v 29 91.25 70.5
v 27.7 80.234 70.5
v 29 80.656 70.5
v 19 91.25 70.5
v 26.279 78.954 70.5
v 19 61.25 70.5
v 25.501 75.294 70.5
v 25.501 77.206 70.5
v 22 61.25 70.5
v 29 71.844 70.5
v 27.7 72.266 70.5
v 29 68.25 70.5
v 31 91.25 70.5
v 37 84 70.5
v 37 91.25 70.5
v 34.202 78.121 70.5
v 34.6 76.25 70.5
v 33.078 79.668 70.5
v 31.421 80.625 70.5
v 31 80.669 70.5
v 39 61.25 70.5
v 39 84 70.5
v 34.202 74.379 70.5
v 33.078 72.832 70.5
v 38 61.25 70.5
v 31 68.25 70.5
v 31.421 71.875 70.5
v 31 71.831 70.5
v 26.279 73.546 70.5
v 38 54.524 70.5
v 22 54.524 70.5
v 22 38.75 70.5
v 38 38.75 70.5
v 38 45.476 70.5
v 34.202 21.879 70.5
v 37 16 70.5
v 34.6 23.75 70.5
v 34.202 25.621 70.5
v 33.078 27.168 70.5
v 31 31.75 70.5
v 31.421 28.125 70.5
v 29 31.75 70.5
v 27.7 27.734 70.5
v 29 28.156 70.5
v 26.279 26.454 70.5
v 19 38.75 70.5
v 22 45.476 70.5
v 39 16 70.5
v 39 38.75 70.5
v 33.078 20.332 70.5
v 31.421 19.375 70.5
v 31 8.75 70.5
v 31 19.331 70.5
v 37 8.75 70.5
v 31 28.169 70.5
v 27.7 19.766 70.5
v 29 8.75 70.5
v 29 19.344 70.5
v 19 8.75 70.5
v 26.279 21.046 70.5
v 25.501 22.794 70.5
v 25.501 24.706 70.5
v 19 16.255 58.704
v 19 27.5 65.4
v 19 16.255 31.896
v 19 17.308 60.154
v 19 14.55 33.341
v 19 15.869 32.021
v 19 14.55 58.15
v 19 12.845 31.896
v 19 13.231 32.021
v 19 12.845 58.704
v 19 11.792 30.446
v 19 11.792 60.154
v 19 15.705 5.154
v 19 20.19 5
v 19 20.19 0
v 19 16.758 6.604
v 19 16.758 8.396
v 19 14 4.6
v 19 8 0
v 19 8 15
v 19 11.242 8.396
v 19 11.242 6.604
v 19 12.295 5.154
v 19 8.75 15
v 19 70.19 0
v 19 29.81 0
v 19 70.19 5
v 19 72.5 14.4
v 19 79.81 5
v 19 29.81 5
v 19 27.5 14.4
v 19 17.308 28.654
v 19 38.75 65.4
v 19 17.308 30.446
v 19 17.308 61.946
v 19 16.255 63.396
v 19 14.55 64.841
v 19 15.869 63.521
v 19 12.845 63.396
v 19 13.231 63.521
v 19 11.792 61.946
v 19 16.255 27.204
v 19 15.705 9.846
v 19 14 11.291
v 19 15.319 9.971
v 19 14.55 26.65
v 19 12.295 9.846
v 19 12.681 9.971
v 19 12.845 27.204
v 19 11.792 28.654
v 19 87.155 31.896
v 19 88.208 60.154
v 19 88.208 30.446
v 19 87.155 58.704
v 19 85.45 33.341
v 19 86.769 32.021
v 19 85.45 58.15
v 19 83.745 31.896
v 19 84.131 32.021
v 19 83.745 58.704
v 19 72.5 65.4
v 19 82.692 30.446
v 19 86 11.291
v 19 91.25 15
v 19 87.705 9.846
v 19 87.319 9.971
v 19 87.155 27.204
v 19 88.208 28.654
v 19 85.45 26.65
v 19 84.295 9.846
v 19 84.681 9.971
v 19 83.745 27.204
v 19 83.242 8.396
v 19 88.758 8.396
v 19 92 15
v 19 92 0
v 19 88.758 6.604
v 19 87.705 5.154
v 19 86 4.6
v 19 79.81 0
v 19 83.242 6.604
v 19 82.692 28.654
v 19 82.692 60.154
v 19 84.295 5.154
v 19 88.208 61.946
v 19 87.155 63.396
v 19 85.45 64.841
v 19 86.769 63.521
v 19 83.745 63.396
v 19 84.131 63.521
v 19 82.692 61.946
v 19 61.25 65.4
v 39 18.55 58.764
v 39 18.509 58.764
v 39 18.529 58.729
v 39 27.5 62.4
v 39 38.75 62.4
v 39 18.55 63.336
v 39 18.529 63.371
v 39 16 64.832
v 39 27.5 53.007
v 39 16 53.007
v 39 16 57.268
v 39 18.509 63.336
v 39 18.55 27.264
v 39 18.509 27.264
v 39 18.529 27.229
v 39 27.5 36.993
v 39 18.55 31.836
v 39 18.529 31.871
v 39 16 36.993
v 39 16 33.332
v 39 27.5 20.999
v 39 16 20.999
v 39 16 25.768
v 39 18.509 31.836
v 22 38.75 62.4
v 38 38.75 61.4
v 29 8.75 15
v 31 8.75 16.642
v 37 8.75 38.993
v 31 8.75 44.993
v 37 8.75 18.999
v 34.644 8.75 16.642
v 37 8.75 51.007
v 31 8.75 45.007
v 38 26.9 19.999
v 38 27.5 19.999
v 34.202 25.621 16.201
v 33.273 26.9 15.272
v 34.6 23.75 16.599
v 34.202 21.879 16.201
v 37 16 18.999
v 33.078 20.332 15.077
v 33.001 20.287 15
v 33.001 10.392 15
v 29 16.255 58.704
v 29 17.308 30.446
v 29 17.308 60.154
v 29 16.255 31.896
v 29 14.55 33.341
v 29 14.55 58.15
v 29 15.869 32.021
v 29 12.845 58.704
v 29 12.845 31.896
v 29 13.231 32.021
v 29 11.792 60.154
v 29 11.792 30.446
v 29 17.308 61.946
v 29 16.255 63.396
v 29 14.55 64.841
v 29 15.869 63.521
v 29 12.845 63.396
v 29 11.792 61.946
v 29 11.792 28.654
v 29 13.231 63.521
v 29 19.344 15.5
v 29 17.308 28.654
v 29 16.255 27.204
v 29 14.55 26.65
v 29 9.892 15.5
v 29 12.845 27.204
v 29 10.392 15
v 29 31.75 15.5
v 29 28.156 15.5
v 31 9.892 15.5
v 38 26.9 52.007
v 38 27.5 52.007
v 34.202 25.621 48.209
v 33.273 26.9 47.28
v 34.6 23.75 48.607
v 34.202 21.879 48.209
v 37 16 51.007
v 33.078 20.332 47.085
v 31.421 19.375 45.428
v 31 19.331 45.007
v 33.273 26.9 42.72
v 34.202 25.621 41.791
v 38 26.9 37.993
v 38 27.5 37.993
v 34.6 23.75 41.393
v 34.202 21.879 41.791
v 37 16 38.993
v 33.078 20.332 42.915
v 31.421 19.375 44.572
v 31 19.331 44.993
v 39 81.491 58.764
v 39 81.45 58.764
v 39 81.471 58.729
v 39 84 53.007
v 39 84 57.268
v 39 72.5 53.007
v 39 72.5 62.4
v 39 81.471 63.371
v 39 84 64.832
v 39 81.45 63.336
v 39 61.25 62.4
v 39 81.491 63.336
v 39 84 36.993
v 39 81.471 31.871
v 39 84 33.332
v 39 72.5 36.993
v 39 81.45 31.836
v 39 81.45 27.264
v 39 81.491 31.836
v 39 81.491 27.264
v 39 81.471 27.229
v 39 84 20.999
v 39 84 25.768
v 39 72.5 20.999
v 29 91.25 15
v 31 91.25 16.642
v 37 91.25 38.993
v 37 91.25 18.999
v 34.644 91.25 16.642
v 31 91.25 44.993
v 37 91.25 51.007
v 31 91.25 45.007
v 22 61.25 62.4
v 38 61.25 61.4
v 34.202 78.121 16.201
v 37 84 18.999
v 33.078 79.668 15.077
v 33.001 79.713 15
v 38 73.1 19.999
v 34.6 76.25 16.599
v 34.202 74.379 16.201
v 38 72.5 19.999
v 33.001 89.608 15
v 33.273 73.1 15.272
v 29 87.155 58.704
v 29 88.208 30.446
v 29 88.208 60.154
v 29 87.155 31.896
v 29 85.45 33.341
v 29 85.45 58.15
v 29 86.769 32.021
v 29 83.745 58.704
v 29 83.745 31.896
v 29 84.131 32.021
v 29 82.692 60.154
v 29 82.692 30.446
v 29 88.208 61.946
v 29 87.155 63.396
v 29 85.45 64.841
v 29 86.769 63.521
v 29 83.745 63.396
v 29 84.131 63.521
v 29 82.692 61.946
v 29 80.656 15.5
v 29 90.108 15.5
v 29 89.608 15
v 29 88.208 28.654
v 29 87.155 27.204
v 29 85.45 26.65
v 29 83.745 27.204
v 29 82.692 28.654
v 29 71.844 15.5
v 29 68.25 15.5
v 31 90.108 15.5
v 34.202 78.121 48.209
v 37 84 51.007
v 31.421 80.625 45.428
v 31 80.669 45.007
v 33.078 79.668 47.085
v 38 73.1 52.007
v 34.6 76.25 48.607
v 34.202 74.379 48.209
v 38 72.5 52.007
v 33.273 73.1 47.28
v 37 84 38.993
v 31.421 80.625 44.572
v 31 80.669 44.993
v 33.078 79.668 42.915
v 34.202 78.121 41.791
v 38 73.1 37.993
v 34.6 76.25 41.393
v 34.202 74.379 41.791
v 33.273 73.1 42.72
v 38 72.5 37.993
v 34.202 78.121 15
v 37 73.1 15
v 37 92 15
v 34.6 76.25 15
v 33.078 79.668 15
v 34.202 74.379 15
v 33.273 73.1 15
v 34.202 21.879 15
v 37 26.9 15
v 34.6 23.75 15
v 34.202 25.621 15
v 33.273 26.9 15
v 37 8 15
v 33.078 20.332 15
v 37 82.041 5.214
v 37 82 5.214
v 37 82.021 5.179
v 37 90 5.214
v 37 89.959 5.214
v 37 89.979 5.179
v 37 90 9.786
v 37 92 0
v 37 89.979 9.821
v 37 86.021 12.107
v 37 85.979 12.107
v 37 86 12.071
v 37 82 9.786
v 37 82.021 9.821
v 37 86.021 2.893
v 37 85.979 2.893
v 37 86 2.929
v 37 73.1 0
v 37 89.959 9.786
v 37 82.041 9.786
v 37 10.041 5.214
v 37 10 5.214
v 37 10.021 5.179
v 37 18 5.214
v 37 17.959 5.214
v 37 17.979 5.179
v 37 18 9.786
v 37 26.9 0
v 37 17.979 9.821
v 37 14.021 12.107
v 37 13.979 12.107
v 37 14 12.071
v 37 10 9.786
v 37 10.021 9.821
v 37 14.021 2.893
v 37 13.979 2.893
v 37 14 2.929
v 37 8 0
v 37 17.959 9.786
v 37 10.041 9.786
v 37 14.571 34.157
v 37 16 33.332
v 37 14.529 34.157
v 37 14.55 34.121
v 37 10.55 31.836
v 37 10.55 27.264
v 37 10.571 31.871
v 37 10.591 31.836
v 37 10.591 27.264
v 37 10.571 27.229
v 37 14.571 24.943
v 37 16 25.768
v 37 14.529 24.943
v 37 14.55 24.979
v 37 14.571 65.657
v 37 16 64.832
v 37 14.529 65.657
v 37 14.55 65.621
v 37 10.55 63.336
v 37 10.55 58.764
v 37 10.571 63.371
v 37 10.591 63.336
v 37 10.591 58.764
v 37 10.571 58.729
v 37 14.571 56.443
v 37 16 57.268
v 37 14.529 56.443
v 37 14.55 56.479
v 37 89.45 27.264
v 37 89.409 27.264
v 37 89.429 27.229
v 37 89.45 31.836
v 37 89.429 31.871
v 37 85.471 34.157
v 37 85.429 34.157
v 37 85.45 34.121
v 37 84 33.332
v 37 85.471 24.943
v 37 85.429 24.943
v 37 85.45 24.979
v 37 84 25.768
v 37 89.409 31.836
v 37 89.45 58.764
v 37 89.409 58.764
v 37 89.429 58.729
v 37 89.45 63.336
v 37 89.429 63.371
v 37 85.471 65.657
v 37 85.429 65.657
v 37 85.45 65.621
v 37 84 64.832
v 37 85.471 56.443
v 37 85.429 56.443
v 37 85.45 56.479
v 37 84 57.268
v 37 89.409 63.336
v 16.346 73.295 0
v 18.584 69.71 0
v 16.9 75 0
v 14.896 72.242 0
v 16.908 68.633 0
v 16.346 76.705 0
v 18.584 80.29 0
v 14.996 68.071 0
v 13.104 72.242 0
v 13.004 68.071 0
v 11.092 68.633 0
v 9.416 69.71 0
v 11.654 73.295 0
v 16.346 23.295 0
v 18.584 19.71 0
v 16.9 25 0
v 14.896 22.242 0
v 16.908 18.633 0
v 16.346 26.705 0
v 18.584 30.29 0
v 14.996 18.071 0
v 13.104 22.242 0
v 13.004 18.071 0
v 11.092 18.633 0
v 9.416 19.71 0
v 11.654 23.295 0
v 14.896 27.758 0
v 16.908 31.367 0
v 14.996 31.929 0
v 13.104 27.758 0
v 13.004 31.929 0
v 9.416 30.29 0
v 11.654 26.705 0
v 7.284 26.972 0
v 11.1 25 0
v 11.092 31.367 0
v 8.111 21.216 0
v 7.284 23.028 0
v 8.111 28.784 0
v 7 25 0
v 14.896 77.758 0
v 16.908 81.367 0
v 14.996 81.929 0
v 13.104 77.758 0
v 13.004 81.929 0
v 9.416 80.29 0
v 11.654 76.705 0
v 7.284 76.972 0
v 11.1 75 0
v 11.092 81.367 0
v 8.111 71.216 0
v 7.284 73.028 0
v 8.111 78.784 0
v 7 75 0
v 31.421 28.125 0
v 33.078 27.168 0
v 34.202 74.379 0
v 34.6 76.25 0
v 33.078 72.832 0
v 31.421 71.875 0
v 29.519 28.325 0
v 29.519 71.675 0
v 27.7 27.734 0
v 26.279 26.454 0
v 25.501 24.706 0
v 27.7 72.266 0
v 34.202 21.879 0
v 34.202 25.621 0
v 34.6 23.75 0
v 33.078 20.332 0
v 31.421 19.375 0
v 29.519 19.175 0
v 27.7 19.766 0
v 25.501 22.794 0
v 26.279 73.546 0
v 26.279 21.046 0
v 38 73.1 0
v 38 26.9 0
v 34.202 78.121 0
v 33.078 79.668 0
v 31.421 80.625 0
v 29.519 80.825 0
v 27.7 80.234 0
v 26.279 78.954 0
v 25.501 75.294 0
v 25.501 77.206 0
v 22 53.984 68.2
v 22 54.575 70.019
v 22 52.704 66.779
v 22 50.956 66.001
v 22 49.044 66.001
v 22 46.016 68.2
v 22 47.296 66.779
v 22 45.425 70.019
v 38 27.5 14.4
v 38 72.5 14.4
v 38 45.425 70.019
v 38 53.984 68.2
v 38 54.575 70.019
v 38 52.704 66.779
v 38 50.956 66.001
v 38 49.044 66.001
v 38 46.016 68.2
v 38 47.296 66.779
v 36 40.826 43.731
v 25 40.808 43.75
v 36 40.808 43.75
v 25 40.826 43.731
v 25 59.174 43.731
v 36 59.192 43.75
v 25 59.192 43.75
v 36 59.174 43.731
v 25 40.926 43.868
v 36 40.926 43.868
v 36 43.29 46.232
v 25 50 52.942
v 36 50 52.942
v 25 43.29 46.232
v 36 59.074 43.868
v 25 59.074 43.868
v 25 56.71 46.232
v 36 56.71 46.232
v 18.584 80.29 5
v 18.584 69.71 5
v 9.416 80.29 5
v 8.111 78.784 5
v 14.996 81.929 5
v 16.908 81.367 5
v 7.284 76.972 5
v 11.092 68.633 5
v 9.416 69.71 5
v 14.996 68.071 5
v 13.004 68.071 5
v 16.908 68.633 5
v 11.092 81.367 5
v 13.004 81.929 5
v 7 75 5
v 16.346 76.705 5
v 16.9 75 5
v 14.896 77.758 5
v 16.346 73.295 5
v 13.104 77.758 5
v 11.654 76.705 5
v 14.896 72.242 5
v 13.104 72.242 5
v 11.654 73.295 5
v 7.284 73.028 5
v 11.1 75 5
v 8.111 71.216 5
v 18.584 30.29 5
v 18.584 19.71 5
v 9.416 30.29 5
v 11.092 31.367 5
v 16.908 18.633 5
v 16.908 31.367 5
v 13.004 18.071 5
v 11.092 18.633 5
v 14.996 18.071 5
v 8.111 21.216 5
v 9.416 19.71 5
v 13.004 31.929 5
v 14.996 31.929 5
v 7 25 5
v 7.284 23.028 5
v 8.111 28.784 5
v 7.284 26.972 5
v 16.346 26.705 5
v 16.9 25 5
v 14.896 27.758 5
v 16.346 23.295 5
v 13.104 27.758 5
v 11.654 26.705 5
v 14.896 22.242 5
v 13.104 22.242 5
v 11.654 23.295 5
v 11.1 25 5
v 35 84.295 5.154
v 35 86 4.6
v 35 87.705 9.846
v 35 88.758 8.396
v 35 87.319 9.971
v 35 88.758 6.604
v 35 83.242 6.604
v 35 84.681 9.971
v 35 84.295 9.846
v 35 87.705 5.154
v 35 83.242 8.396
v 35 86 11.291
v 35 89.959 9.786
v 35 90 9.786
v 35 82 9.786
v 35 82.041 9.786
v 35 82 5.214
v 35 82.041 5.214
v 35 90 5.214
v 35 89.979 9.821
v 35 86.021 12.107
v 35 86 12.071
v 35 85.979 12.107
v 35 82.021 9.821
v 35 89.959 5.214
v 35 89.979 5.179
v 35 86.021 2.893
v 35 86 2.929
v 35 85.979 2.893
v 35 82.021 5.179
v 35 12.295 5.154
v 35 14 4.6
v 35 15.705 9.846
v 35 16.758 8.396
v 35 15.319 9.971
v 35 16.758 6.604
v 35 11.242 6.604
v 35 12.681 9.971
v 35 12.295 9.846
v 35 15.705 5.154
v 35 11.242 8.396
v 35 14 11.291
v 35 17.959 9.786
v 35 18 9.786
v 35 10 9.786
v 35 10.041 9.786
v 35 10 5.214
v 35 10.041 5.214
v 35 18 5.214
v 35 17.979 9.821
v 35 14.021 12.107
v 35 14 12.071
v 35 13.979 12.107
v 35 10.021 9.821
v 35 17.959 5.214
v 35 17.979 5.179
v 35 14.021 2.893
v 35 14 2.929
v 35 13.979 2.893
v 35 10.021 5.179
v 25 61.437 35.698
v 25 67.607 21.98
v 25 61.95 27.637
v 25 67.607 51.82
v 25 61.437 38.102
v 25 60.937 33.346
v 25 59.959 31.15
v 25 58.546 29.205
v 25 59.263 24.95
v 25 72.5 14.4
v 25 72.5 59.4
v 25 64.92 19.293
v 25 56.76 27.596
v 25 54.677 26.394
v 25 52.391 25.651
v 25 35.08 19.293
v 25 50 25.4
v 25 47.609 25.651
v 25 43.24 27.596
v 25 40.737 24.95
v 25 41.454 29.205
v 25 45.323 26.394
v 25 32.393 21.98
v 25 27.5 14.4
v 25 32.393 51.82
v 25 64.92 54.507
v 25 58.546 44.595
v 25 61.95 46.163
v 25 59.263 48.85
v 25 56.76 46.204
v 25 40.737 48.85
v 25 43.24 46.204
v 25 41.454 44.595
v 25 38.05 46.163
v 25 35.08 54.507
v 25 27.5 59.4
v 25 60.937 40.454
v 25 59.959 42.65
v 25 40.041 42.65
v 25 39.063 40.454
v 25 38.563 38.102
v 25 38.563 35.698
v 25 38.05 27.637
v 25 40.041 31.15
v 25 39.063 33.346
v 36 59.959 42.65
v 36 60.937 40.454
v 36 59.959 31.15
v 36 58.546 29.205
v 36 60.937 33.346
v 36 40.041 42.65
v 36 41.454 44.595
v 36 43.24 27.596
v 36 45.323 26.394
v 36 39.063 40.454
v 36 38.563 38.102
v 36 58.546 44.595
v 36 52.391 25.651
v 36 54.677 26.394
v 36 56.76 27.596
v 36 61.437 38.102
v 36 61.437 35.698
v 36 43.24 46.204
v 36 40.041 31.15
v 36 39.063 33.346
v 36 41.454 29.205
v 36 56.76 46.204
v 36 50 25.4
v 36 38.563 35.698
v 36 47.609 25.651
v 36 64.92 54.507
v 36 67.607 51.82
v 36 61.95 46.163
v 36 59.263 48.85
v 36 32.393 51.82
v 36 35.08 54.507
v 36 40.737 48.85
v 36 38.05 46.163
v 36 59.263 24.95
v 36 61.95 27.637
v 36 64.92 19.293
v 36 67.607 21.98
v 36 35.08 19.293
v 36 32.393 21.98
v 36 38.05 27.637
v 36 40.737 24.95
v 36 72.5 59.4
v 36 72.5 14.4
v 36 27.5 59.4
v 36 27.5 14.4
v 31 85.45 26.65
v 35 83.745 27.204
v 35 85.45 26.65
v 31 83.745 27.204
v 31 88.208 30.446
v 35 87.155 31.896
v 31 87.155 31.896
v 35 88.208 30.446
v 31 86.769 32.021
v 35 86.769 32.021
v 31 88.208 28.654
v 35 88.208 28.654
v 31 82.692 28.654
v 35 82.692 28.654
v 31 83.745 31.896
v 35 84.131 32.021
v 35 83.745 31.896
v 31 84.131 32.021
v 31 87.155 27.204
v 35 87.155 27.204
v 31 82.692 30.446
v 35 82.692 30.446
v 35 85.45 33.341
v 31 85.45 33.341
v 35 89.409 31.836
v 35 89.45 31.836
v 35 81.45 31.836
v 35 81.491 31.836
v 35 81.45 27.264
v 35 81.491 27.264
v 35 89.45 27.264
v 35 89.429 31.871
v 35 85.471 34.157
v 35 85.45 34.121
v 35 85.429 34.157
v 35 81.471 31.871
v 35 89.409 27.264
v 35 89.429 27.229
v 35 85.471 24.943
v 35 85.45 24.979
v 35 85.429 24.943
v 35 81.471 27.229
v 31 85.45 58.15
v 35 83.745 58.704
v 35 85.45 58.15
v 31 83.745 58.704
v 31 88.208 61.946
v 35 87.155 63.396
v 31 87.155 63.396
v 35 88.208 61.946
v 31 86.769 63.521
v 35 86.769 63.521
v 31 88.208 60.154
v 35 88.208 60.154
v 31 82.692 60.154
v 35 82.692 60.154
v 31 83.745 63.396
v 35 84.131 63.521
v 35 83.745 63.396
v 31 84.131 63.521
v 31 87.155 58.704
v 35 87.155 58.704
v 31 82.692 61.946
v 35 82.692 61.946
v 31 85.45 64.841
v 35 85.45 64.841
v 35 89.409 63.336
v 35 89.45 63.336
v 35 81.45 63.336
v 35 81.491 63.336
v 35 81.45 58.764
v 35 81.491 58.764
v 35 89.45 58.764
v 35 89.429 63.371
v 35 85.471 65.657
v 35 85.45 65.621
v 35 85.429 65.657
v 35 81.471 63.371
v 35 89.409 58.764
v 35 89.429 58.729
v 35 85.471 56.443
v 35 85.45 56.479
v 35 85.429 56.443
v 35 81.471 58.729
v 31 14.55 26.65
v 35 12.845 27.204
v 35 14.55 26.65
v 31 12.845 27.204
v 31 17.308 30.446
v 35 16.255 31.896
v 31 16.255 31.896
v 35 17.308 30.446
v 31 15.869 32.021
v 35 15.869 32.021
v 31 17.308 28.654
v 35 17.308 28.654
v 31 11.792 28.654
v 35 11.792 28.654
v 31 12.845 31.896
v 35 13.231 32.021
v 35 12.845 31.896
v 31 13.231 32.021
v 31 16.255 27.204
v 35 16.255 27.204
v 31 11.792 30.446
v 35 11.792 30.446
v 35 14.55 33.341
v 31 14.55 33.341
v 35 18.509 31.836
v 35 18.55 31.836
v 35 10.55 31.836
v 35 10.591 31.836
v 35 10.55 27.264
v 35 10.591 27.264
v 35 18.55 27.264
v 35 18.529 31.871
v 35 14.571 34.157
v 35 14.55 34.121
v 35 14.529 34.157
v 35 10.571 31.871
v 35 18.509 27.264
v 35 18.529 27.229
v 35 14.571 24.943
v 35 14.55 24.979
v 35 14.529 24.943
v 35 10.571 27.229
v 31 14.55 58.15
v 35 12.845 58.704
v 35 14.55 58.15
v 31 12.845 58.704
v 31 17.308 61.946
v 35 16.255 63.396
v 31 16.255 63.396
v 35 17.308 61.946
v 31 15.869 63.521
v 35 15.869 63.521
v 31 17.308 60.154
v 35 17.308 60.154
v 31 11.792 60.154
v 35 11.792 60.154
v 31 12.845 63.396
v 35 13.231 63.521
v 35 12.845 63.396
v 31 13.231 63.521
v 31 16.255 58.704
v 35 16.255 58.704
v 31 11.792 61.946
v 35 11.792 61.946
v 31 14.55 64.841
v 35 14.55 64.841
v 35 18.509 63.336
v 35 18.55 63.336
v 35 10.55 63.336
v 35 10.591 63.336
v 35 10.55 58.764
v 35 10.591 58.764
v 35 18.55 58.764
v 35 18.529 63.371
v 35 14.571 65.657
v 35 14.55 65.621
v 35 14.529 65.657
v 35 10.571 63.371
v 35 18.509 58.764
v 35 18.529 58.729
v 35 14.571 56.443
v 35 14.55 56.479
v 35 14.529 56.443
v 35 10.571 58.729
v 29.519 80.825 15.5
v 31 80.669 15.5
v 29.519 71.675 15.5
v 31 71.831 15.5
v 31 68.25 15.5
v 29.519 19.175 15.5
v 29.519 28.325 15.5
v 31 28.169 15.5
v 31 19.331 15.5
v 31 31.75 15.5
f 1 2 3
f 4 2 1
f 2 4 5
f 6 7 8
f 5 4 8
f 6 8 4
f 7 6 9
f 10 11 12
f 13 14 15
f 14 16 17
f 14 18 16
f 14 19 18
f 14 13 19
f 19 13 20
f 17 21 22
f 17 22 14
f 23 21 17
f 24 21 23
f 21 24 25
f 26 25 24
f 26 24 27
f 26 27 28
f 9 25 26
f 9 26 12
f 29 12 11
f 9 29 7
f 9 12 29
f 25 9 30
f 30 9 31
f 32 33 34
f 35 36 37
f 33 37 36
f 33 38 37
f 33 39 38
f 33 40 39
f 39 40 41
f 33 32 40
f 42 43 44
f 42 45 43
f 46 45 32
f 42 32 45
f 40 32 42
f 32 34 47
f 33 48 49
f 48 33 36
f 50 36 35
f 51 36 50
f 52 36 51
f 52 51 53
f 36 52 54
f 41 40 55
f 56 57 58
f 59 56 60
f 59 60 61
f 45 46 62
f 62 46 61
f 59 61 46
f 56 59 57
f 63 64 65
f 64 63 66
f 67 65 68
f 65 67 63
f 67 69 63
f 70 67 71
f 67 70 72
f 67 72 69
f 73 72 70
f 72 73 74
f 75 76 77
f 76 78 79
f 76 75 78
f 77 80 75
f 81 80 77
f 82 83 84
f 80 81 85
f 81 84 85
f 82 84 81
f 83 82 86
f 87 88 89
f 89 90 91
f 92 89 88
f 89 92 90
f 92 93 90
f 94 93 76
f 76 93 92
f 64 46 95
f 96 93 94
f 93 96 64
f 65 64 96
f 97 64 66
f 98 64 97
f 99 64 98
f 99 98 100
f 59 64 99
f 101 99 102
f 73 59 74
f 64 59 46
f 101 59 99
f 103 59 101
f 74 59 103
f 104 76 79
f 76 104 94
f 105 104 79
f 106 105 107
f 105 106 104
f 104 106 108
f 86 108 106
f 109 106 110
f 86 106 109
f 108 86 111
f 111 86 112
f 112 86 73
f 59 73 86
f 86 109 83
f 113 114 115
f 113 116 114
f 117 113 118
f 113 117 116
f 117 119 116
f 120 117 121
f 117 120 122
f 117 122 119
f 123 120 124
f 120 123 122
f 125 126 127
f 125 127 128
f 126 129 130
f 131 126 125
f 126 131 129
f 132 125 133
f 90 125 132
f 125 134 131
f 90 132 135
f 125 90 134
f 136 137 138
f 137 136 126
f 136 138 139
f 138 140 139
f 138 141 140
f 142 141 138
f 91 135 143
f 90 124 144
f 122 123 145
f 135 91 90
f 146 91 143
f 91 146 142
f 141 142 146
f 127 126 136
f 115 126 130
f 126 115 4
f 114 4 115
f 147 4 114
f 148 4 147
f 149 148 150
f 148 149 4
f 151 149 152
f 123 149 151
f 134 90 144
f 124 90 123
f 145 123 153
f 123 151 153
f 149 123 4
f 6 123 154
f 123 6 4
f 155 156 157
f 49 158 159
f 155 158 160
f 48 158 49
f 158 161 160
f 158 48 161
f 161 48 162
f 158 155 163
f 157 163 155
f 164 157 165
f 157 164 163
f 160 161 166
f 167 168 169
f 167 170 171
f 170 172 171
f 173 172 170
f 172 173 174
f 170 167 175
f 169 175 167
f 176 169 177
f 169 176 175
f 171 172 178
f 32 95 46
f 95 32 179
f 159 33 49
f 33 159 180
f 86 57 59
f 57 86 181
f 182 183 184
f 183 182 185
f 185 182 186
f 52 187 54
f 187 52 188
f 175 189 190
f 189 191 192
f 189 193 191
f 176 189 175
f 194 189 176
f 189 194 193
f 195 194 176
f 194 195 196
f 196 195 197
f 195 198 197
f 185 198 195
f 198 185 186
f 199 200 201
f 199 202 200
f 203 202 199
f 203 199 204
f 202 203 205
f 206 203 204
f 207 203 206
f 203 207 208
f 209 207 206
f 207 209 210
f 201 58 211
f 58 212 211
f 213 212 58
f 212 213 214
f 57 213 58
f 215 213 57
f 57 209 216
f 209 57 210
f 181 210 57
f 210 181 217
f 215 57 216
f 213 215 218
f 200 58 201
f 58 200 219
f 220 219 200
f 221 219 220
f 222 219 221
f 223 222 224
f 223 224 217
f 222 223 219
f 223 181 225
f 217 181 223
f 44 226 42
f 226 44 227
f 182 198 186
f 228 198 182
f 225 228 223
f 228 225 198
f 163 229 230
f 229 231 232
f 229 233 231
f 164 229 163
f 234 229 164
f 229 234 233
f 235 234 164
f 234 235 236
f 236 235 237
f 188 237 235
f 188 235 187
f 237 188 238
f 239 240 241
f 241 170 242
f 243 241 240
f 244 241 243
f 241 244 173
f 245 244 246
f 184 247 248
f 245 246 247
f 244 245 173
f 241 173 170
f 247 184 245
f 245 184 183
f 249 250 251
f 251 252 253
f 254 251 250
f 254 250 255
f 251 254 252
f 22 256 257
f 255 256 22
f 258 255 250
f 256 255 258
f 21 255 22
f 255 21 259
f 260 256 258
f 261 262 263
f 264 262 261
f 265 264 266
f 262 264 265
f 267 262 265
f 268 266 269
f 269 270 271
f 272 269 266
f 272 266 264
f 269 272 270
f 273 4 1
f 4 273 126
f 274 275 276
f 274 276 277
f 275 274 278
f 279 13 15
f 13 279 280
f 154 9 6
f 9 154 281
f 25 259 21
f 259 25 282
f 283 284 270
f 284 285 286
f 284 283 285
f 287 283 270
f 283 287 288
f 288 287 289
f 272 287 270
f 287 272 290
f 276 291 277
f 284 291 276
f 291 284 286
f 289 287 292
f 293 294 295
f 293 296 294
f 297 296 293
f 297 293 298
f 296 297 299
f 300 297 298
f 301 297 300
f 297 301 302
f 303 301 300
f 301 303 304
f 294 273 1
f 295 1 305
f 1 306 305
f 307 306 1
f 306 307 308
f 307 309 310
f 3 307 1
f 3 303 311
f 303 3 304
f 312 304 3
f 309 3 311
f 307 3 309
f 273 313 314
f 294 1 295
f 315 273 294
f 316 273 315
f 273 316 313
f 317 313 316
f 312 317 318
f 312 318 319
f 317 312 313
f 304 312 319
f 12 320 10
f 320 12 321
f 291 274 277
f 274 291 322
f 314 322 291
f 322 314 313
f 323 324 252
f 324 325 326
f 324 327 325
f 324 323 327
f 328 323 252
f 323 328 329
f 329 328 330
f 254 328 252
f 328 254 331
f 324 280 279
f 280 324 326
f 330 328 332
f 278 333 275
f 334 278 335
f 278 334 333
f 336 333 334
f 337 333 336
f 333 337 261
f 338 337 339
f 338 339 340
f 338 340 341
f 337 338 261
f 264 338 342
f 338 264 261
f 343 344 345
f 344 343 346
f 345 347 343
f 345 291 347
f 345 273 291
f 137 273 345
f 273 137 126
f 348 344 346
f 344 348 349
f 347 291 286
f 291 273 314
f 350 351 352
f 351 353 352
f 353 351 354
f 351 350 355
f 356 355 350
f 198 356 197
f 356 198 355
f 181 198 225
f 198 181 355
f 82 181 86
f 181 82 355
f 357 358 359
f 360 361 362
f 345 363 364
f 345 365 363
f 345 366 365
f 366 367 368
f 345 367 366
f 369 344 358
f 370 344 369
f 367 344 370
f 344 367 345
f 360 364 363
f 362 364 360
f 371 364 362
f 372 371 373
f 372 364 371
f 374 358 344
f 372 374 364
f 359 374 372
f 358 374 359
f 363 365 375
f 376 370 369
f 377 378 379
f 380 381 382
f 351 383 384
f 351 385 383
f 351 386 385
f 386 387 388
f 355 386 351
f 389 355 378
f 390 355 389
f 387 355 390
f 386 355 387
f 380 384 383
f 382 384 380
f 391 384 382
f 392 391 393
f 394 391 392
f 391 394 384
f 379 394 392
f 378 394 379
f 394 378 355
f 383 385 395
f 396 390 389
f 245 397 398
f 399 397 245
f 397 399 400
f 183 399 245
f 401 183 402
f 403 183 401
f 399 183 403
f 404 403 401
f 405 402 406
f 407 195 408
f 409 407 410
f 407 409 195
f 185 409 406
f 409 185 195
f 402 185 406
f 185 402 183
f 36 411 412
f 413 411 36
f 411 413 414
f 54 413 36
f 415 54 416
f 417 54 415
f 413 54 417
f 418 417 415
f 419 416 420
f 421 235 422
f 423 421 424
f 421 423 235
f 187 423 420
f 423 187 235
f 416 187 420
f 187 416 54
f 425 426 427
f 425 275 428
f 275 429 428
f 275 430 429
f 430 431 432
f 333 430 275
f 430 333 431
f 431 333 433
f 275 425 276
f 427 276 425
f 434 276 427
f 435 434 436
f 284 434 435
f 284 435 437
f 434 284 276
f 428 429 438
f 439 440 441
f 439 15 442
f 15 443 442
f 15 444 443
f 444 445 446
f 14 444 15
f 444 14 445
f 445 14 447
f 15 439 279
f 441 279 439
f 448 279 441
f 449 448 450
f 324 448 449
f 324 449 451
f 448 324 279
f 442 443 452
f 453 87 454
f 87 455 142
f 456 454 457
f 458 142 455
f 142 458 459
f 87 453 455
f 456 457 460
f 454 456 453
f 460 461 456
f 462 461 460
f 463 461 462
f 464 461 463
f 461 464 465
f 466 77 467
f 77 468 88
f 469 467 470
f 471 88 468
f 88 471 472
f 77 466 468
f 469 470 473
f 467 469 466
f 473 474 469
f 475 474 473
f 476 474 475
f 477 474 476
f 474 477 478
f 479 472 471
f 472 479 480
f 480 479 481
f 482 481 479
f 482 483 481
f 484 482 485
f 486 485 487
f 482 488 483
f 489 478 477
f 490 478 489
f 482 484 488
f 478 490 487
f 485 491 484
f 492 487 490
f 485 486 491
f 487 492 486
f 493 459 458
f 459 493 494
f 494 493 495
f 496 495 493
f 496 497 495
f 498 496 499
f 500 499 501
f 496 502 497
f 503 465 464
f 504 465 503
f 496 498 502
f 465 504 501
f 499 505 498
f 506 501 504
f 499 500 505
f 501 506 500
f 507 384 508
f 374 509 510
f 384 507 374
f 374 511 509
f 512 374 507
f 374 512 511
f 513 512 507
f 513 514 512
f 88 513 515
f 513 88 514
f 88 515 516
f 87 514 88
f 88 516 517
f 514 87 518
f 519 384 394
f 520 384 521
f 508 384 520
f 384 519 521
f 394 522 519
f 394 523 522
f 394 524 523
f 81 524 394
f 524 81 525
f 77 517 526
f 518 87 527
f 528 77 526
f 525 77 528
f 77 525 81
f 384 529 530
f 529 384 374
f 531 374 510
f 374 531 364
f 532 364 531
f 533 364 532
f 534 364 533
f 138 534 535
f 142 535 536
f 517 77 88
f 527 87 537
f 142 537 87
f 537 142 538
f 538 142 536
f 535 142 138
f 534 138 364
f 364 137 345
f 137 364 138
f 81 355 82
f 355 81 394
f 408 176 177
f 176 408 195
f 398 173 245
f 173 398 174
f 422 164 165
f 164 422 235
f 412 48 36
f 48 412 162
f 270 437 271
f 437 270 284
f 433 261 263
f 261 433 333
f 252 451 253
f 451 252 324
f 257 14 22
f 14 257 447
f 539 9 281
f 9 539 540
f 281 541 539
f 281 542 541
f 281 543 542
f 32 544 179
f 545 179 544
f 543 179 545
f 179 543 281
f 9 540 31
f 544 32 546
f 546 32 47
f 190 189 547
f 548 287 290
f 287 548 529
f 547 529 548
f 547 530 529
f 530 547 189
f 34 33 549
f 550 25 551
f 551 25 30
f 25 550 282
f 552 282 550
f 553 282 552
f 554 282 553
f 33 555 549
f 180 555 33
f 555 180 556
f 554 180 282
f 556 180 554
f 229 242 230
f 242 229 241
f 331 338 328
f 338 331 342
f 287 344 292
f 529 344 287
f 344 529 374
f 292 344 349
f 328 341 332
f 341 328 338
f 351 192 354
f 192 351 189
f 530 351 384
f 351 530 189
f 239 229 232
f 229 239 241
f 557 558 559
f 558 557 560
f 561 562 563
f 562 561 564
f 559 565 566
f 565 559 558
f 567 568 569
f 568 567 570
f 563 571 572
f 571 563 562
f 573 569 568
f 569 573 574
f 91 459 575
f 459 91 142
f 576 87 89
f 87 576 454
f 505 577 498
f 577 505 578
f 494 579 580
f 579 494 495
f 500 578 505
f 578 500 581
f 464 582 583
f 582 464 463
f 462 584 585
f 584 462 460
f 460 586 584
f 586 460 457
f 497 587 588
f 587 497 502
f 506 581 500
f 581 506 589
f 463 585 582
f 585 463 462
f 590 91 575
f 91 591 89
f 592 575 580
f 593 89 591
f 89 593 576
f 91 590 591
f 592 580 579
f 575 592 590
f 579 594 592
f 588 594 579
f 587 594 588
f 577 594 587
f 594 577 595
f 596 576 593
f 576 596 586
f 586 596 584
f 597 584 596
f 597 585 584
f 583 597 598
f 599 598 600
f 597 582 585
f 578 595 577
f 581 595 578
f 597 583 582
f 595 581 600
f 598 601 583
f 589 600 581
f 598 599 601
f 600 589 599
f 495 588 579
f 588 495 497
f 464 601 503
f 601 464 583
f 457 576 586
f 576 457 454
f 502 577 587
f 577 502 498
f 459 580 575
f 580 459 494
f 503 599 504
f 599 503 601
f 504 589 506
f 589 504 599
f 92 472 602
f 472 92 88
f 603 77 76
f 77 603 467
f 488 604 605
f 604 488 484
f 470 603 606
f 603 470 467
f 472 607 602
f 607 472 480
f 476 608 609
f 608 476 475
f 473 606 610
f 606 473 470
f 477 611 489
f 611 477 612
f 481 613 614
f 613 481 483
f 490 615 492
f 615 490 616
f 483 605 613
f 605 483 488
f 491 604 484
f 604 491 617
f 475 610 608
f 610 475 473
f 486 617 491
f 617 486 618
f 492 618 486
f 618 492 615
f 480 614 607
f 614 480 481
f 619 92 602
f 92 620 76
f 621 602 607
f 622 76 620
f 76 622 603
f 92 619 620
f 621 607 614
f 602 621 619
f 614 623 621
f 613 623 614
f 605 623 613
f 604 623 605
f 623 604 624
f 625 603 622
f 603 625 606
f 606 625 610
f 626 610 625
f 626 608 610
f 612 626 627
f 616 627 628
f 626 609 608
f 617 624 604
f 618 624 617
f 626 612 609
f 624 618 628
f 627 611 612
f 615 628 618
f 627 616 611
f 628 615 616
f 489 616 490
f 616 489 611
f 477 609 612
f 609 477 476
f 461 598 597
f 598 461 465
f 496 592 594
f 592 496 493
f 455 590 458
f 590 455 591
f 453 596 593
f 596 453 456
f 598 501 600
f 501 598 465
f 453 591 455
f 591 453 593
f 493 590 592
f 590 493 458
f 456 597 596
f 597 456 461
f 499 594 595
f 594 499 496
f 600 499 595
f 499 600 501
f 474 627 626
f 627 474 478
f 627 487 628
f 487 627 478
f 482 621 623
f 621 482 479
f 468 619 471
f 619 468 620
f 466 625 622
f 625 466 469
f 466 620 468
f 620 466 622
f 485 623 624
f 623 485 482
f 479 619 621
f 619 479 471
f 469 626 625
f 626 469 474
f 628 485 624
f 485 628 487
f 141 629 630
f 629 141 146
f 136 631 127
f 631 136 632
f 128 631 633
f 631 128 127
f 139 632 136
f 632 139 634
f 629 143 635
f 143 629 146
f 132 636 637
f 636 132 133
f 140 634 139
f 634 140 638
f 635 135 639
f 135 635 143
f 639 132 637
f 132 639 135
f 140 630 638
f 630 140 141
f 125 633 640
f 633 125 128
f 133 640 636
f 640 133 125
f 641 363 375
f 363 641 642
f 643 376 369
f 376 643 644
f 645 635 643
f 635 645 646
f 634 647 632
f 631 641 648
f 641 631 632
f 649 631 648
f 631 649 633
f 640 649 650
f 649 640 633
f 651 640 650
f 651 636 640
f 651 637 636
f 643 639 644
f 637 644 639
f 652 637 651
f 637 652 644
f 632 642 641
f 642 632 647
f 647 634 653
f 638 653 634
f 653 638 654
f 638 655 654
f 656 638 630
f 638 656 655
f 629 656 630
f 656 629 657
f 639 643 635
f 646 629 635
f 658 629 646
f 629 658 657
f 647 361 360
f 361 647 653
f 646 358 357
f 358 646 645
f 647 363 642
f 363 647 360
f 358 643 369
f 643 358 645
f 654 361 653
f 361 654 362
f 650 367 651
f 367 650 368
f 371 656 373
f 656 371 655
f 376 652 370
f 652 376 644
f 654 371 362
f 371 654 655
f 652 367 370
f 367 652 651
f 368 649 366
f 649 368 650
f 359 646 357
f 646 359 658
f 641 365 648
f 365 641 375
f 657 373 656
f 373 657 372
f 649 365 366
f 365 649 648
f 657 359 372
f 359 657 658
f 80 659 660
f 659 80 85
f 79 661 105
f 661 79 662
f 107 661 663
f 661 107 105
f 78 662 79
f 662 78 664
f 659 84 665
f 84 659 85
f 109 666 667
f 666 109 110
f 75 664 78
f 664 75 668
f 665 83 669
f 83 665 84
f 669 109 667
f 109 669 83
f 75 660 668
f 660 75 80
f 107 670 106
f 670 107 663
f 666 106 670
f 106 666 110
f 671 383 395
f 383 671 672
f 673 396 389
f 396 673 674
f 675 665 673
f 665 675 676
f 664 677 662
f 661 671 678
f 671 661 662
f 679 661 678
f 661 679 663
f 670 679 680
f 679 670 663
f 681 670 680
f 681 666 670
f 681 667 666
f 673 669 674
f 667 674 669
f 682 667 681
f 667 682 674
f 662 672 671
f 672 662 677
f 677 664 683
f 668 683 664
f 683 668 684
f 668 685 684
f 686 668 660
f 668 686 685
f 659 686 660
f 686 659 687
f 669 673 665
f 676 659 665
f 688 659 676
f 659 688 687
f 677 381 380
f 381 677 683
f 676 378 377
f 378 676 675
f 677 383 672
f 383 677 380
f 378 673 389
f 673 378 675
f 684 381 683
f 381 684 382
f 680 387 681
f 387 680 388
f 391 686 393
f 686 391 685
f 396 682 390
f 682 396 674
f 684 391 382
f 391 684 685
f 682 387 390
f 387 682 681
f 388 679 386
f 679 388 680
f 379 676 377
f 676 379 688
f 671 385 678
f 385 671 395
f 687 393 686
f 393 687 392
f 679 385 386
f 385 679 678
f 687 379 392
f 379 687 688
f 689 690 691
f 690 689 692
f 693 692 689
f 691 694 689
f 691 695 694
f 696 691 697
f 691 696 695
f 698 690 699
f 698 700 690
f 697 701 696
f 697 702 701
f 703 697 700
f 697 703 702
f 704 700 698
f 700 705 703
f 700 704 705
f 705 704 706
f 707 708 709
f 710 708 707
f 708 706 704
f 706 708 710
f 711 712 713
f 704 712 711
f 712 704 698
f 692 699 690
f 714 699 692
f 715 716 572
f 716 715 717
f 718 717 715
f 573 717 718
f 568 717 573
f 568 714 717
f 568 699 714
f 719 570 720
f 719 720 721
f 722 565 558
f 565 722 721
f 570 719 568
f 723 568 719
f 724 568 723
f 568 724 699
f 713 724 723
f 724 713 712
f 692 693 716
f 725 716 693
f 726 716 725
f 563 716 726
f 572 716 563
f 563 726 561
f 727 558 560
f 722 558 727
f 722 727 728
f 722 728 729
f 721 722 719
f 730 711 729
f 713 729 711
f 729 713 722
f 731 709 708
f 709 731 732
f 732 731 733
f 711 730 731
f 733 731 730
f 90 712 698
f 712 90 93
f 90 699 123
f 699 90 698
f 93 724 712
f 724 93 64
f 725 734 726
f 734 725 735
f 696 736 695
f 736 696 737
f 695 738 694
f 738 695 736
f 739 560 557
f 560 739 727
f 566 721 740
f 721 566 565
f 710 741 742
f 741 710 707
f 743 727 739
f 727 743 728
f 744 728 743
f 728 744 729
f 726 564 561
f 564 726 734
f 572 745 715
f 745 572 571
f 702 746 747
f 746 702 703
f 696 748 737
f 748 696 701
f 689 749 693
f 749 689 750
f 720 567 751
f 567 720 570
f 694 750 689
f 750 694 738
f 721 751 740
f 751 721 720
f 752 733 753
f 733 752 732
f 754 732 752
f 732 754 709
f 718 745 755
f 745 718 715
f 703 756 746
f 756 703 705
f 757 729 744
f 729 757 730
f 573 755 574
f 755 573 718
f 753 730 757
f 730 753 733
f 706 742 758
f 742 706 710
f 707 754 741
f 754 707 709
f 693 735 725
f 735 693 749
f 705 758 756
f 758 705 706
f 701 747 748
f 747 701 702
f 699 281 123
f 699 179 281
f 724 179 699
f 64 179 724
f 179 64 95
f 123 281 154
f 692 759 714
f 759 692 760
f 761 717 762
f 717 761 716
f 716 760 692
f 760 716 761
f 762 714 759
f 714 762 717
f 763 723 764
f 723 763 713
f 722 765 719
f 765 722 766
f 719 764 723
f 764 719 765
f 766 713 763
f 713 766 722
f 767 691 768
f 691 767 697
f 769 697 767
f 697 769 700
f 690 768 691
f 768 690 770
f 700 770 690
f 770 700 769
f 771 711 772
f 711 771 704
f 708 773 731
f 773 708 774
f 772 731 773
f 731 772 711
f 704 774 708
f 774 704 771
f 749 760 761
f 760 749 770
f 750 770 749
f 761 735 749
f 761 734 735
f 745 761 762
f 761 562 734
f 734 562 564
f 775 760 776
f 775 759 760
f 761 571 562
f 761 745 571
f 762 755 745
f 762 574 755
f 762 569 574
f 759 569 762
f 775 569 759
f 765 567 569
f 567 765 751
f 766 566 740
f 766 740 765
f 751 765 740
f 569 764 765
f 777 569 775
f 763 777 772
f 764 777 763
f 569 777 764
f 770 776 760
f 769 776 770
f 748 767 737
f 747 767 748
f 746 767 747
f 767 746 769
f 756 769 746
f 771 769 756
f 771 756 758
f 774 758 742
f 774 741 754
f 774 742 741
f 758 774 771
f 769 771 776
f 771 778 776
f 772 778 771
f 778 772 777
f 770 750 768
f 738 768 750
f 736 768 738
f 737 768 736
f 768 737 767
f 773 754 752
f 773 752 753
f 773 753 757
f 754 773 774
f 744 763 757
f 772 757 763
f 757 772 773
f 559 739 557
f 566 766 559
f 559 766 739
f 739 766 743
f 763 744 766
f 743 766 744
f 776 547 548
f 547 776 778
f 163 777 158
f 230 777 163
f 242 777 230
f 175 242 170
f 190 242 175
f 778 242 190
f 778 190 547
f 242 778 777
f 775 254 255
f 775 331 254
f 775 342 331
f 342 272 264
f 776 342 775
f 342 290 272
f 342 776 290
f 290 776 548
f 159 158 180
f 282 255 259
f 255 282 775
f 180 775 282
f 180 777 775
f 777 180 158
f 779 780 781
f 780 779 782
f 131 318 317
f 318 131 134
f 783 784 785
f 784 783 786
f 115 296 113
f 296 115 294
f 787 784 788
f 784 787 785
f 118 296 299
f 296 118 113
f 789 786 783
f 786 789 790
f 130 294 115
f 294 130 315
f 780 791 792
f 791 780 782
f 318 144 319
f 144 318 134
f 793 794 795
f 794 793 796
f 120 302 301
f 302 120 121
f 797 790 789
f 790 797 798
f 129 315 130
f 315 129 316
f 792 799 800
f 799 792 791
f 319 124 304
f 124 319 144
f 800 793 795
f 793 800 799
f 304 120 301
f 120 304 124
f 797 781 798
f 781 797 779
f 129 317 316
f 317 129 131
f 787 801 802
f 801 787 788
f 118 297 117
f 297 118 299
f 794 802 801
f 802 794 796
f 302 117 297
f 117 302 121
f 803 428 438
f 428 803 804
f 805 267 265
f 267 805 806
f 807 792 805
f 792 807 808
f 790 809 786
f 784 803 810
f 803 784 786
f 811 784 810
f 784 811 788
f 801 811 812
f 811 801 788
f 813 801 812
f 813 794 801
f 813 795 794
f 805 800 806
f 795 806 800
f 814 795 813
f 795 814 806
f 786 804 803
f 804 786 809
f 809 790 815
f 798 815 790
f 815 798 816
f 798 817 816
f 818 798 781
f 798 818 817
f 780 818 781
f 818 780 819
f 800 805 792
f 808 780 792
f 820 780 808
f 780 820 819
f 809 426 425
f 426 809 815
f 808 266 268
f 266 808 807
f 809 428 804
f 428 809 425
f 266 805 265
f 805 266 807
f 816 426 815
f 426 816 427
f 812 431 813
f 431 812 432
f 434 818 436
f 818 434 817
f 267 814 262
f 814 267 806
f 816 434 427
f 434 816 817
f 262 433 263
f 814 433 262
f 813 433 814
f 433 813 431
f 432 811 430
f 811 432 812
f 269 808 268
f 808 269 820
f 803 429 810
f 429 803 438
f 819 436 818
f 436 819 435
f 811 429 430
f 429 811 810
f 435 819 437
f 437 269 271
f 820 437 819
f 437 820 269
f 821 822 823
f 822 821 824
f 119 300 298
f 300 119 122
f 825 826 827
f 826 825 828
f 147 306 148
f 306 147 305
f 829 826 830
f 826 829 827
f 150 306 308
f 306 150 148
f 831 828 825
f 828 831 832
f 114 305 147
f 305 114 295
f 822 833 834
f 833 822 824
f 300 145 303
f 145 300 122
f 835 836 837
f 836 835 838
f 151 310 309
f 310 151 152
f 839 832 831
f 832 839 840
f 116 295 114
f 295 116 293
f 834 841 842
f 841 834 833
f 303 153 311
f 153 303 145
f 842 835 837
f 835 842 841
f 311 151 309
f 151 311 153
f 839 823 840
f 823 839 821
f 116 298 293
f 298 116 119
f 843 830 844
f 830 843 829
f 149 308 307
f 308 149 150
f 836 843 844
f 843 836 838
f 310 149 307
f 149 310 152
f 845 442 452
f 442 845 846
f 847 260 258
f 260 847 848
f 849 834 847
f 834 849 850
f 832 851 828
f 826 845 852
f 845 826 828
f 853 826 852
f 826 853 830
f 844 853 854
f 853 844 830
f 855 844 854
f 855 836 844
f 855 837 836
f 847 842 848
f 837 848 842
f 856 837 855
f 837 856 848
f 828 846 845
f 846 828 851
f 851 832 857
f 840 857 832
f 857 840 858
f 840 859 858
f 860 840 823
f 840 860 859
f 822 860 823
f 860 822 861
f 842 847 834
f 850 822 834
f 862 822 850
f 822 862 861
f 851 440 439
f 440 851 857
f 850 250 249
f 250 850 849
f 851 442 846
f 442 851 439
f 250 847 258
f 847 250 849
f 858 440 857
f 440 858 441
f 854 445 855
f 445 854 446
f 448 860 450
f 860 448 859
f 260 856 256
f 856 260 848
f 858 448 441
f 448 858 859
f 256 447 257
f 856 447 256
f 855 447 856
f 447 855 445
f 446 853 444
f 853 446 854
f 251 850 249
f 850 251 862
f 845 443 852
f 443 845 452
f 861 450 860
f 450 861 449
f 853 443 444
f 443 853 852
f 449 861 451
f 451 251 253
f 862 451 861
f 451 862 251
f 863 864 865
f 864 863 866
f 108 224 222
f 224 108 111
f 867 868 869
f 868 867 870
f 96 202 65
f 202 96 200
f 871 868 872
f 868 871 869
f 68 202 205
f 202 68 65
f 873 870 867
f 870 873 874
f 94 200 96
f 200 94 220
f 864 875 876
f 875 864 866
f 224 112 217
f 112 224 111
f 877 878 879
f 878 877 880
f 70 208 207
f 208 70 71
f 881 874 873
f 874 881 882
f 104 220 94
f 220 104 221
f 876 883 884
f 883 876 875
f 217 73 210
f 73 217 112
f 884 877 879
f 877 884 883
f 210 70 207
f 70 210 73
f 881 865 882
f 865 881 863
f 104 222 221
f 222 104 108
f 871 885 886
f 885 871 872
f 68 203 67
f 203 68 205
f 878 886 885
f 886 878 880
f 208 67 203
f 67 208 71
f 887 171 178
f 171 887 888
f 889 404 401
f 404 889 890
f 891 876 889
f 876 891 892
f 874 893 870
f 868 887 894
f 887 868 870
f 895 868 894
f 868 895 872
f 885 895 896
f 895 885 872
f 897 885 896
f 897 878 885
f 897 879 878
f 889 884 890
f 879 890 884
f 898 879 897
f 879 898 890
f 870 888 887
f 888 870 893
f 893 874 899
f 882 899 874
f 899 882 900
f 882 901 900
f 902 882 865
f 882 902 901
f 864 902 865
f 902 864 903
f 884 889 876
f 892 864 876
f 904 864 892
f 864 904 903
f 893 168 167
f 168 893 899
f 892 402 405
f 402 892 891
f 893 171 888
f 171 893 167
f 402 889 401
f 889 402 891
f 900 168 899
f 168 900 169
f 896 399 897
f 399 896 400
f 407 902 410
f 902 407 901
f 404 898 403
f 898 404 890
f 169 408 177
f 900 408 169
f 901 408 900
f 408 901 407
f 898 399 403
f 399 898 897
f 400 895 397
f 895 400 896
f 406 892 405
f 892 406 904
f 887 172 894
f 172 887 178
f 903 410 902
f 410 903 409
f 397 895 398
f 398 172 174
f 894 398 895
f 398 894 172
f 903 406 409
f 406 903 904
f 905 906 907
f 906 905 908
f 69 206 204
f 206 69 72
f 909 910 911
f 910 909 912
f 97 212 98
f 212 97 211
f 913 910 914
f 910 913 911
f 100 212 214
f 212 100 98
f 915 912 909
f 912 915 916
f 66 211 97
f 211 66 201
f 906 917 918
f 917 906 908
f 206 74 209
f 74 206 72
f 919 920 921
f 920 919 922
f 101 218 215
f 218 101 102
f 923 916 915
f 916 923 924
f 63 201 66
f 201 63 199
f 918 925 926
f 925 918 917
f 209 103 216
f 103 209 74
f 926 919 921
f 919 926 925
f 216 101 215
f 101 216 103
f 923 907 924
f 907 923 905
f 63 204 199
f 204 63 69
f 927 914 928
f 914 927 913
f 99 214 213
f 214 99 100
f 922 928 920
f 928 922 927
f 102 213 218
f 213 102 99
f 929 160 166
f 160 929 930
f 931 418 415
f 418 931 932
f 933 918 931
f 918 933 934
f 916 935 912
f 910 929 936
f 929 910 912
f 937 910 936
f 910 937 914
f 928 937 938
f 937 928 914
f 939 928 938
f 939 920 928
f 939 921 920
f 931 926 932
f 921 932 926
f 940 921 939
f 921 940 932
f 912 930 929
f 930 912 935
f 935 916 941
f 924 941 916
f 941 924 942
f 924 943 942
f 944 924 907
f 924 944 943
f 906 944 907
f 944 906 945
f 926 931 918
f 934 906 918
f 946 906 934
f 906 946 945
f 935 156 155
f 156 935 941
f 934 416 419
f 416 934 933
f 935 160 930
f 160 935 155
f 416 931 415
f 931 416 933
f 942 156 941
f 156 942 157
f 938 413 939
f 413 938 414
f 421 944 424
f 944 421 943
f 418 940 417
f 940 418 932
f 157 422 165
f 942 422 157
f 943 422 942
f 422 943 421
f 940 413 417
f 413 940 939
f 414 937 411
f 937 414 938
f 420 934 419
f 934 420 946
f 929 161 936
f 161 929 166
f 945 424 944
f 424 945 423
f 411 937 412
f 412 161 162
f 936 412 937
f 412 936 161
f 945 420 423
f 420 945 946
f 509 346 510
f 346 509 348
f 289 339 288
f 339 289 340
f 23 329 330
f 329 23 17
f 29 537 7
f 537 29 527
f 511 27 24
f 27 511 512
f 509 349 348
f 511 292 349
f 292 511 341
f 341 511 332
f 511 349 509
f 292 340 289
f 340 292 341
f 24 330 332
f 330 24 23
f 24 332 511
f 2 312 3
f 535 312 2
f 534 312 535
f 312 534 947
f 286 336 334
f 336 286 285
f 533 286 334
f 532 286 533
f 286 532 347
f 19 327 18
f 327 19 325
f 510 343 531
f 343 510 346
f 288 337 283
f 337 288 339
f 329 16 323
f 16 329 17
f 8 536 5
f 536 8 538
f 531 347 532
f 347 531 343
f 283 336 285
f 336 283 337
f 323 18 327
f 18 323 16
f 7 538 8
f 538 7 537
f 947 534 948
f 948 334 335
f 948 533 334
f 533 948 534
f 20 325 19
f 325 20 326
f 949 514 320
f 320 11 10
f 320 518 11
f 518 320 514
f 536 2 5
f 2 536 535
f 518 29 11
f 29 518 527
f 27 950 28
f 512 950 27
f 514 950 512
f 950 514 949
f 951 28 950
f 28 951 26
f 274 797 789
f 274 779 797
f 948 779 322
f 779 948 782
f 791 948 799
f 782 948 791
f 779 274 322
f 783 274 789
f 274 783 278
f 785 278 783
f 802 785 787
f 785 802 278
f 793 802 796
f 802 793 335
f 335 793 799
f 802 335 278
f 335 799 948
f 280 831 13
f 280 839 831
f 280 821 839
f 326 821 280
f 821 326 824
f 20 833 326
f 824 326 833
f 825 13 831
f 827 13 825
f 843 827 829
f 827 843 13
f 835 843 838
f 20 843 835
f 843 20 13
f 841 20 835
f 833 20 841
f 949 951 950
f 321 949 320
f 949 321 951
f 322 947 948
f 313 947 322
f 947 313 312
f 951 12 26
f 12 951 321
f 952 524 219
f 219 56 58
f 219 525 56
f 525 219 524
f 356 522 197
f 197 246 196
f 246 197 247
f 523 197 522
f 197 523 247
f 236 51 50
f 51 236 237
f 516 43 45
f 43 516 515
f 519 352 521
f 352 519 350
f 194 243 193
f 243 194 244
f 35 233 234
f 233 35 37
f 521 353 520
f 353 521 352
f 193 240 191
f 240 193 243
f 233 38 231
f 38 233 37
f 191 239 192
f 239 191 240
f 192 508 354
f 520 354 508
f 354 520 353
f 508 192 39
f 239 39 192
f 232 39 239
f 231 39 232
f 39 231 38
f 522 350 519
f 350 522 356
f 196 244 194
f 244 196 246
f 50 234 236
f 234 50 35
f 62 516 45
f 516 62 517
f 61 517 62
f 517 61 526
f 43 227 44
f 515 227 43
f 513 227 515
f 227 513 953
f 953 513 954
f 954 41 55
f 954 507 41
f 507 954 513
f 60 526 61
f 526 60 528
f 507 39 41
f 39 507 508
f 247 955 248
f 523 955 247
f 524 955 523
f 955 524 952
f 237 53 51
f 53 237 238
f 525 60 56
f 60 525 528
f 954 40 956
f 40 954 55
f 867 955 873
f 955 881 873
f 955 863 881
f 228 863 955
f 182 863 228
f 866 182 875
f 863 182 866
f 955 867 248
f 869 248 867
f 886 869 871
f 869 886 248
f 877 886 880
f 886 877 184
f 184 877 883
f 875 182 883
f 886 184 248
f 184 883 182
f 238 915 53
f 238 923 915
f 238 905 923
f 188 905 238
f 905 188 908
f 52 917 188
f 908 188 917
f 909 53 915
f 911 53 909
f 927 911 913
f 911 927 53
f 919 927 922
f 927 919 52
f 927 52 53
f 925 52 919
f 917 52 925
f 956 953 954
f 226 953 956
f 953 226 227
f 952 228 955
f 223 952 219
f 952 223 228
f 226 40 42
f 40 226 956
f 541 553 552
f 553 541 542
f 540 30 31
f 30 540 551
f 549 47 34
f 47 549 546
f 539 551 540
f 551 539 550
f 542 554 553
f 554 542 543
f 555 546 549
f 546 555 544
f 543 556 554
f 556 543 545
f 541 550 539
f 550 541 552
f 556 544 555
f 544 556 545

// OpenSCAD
// 
/*
 *  OpenSCAD Shapes Library (www.openscad.at)
 *  One-piece X Motor bracket for Mendel
 *  by Vik Olliver. Based on examples which are:
 *  Copyright (C) 2009  Catarina Mota <clifford@clifford.at>
 *
 *  This program is free software; you can redistribute it and/or modify
 *  it under the terms of the GNU General Public License as published by
 *  the Free Software Foundation; either version 2 of the License, or
 *  (at your option) any later version.
 *
 *  This program is distributed in the hope that it will be useful,
 *  but WITHOUT ANY WARRANTY; without even the implied warranty of
 *  MERCHANTABILITY or FITNESS FOR A PARTICULAR PURPOSE.  See the
 *  GNU General Public License for more details.
 *
 *  You should have received a copy of the GNU General Public License
 *  along with this program; if not, write to the Free Software
 *  Foundation, Inc., 59 Temple Place, Suite 330, Boston, MA  02111-1307  USA
 *
*/

x_rail_sep=60.5-8;
lower_bracket_width=84;
lower_bracket_base_width=9;
lower_bracket_base_height=15;
lower_bracket_length=63; // Also max dimension on X axis
top_notch_height=lower_bracket_length+7.5;

nema17_side=45;

// Useful constants etc.

m3_clearance_rad=1.9;
m4_clearance_rad=2.9;
m6_clearance_rad=3.7;
m8_tight_rad=4.6;
m8_clearance_rad=4.9;

// The rail clamps.
rail_clamp_width=20;
rail_clamp_height=15;
rail_rad=m8_tight_rad;	// m8_tight_rad, 5.2 for aluminium tube or 3.8 for 1/4 inch rail.

module box(w,h,d) {
	scale ([w,h,d]) cube(1, true);
}

module roundedBox(w,h,d,f){
	difference(){
		box(w,h,d);
		translate([-w/2,h/2,0]) cube(w/(f/2),true);
		translate([w/2,h/2,0]) cube(w/(f/2),true);
		translate([-w/2,-h/2,0]) cube(w/(f/2),true);
		translate([w/2,-h/2,0]) cube(w/(f/2),true);
	}
	translate([-w/2+w/f,h/2-w/f,-d/2]) cylinder(d,w/f, w/f);
	translate([w/2-w/f,h/2-w/f,-d/2]) cylinder(d,w/f, w/f);
	translate([-w/2+w/f,-h/2+w/f,-d/2]) cylinder(d,w/f, w/f);
	translate([w/2-w/f,-h/2+w/f,-d/2]) cylinder(d,w/f, w/f);
}
module hexagon(height, depth) {
	boxWidth=height/1.75;
		union(){
			box(boxWidth, height, depth);
			rotate([0,0,60]) box(boxWidth, height, depth);
			rotate([0,0,-60]) box(boxWidth, height, depth);
		}
}

module m4_hole_horiz(l) {
	cylinder(l,m4_clearance_rad,m4_clearance_rad,center=true);
	translate ([m4_clearance_rad*0.6,0,0]) rotate ([0,0,45])
		cube([m4_clearance_rad,m4_clearance_rad,l],center=true);
}

module m4_hole_vert(l) {
	cylinder(l,m4_clearance_rad,m4_clearance_rad,center=true);
}

module m6_hole_horiz(l) {
	cylinder(l,m6_clearance_rad,m6_clearance_rad,center=true);
	translate ([m6_clearance_rad*0.6,0,0]) rotate ([0,0,45])
		cube([m6_clearance_rad,m6_clearance_rad,l],center=true);
}
module m8_hole_horiz(l) {
	cylinder(l,m8_clearance_rad,m8_clearance_rad,center=true);
	translate ([m8_clearance_rad*0.6,0,0]) rotate ([0,0,45])
		cube([m8_clearance_rad,m8_clearance_rad,l],center=true);
}

// No .4 3/4 inch countersunk woodscrew (includes a lot of headspace)
module small_woodscrew() {
	rotate ([0,0,30]) {
		translate ([0,0,-7.5]) cylinder(h=3,r1=0.2,r2=1.8,center=true);
		cylinder(h=12,r1=1.8,r2=2.0,center=true);
		translate([0,0,6]) cylinder(h=4, r1=2.0, r2=4.0);
	}
}
module m4_nut_cavity(l) {
	hexagon(height=8,depth=l);
}

module m4_hole_vert_with_hex(l) {
	union () {
		m4_hole_vert(l);
		translate ([0,0,-l/4]) rotate ([0,0,30]) m4_nut_cavity(l/2);
	}
}

module m4_hole_horiz_with_hex(l) {
	union () {
		m4_hole_horiz(l);
		translate ([0,0,-l/4]) rotate ([0,0,0]) m4_nut_cavity(l/2);
	}
}

module rail_clamp () {
	translate ([lower_bracket_length/2,0,0]) {
		difference () {
			// Rail clamp body
			box(lower_bracket_length,rail_clamp_height*2,rail_clamp_width);
			// Diagonal ramp at start
			rotate ([0,45,0]) translate ([-lower_bracket_length/2,0,-2.32*rail_clamp_height])
				box(lower_bracket_length,rail_clamp_width*2,rail_clamp_height*2);
			// Diagonal side
			 translate ([-lower_bracket_length/2,-rail_clamp_width,0]) rotate ([0,0,-45])
				translate ([0,-rail_clamp_width/2,-rail_clamp_height]) 
					box(lower_bracket_length,rail_clamp_width*2,rail_clamp_height*2);
			 rotate ([180,0,0]) translate ([-lower_bracket_length/2,-rail_clamp_width,0]) rotate ([0,0,-45])
				translate ([0,-rail_clamp_width/2,rail_clamp_height]) 
					box(lower_bracket_length,rail_clamp_width*2,rail_clamp_height*2);
			// Crimp in the middle
			translate ([6,0,-rail_clamp_height*0.84]) rotate ([0,45,0]) 		
				box(rail_clamp_height,lower_bracket_width,rail_clamp_height);
		}
	}
}

module nema_17() {
	union () {
		translate ([0,0,nema17_side/2]) box(nema17_side,nema17_side,nema17_side);
		cylinder (h=nema17_side*1.5,r=23/2,center=true);
		// Flip-out bit needed when building with X vertical
		translate ([nema17_side/2,0,0])  rotate ([0,-45,0]) translate ([nema17_side/2,0,nema17_side/2]) 
			box(nema17_side,nema17_side,nema17_side);
		// 8mm * M3 clearance slots, 4 of.
		rotate ([0,0,45]) translate([19,0,0]) box(8,m3_clearance_rad*2, 60);
		rotate ([0,0,-45]) translate([19,0,0]) box(8,m3_clearance_rad*2, 60);
		rotate ([0,0,135]) translate([19,0,0]) box(8,m3_clearance_rad*2, 60);
		rotate ([0,0,-135]) translate([19,0,0]) box(8,m3_clearance_rad*2, 60);
	}
}

module x_motor_bracket_body() {
	union () {
		translate ([0,0,2])
			difference () {
				// Solid bits.
				union () {
					box(lower_bracket_base_height,lower_bracket_width,lower_bracket_base_width*2);
					translate ([0,-x_rail_sep/2,-1]) rail_clamp();
					translate ([0,x_rail_sep/2,-1]) rail_clamp();
				}
				// Slivers taken off for passage of belt.
				translate ([0,0,-(2*lower_bracket_base_width)]) 
					box(lower_bracket_base_height+0.5,lower_bracket_width+1,lower_bracket_base_width*2);
				translate ([lower_bracket_length+1,4+lower_bracket_width/-2,-(2*lower_bracket_base_width)]) 
					box(lower_bracket_length*2,rail_clamp_width*0.4,lower_bracket_base_width*2);
				translate ([lower_bracket_length+1,-(4+lower_bracket_width/-2),-(2*lower_bracket_base_width)]) 
					box(lower_bracket_length*2,rail_clamp_width*0.4,lower_bracket_base_width*2);
			}
		// Notched box along the top of the bracket.
		translate ([lower_bracket_length-top_notch_height/2,0,0]) difference () {
			box(top_notch_height,lower_bracket_width*0.55,rail_clamp_width*0.8);
			translate ([8.5,0,0]) rotate([0,0,45]) cube((x_rail_sep-rail_clamp_width)*0.4,center=true);
		}
		// "Mouse ears" for fan
		translate ([-lower_bracket_base_height/2,0,lower_bracket_base_width+7]) difference  () {
			union () {
				translate ([0,25,0]) rotate ([0,90,0]) cylinder(h=5,r=7);
				translate ([0,-25,0]) rotate ([0,90,0]) cylinder(h=5,r=7);
			}
			translate ([0,25,0]) rotate ([0,90,0]) m4_hole_vert(30);
			translate ([0,-25,0]) rotate ([0,90,0]) m4_hole_vert(30);
		}
	}
}
module x_motor_bracket () {
	difference () {
		x_motor_bracket_body();
		// Outer bearings
		translate ([0,(lower_bracket_width-12)/2,4-lower_bracket_base_width]) m4_hole_horiz_with_hex(50);
		translate ([0,(lower_bracket_width-12)/-2,4-lower_bracket_base_width]) m4_hole_horiz_with_hex(50);
		// Rails
		translate ([0,x_rail_sep/2,0]) rotate ([0,90,0]) cylinder(h=200,r=rail_rad,center=true);
		translate ([108,(x_rail_sep/2)+12,0]) box(200,40,2);
		translate ([0,-x_rail_sep/2,0]) rotate ([0,90,0]) cylinder(h=200,r=rail_rad,center=true);
		rotate ([180,0,0]) translate ([108,(x_rail_sep/2)+12,0]) box(200,40,2);
		// NEMA17
		translate ([lower_bracket_width*0.35,0,5]) nema_17();
		rotate ([180,0,0]) translate ([lower_bracket_width*0.35,0,6]) nema_17();
		// Holes for rail grips.
		translate ([lower_bracket_length*0.35,x_rail_sep/2+m8_tight_rad*2,-5]) m4_hole_horiz_with_hex(60);
		translate ([lower_bracket_length*0.85,x_rail_sep/2+m8_tight_rad*2,-5]) m4_hole_horiz_with_hex(60);
		translate ([lower_bracket_length*0.35,-(x_rail_sep/2+m8_tight_rad*2),-5]) m4_hole_horiz_with_hex(60);
		translate ([lower_bracket_length*0.85,-(x_rail_sep/2+m8_tight_rad*2),-5]) m4_hole_horiz_with_hex(60);
		// Notch in the top
		translate([lower_bracket_length,0,0]) cylinder(h=30,r=rail_rad,center=true);
	}
}

translate ([30,50,0]) rotate ([0,-90,0]) translate([lower_bracket_base_height/2,0,0])
	 x_motor_bracket();
